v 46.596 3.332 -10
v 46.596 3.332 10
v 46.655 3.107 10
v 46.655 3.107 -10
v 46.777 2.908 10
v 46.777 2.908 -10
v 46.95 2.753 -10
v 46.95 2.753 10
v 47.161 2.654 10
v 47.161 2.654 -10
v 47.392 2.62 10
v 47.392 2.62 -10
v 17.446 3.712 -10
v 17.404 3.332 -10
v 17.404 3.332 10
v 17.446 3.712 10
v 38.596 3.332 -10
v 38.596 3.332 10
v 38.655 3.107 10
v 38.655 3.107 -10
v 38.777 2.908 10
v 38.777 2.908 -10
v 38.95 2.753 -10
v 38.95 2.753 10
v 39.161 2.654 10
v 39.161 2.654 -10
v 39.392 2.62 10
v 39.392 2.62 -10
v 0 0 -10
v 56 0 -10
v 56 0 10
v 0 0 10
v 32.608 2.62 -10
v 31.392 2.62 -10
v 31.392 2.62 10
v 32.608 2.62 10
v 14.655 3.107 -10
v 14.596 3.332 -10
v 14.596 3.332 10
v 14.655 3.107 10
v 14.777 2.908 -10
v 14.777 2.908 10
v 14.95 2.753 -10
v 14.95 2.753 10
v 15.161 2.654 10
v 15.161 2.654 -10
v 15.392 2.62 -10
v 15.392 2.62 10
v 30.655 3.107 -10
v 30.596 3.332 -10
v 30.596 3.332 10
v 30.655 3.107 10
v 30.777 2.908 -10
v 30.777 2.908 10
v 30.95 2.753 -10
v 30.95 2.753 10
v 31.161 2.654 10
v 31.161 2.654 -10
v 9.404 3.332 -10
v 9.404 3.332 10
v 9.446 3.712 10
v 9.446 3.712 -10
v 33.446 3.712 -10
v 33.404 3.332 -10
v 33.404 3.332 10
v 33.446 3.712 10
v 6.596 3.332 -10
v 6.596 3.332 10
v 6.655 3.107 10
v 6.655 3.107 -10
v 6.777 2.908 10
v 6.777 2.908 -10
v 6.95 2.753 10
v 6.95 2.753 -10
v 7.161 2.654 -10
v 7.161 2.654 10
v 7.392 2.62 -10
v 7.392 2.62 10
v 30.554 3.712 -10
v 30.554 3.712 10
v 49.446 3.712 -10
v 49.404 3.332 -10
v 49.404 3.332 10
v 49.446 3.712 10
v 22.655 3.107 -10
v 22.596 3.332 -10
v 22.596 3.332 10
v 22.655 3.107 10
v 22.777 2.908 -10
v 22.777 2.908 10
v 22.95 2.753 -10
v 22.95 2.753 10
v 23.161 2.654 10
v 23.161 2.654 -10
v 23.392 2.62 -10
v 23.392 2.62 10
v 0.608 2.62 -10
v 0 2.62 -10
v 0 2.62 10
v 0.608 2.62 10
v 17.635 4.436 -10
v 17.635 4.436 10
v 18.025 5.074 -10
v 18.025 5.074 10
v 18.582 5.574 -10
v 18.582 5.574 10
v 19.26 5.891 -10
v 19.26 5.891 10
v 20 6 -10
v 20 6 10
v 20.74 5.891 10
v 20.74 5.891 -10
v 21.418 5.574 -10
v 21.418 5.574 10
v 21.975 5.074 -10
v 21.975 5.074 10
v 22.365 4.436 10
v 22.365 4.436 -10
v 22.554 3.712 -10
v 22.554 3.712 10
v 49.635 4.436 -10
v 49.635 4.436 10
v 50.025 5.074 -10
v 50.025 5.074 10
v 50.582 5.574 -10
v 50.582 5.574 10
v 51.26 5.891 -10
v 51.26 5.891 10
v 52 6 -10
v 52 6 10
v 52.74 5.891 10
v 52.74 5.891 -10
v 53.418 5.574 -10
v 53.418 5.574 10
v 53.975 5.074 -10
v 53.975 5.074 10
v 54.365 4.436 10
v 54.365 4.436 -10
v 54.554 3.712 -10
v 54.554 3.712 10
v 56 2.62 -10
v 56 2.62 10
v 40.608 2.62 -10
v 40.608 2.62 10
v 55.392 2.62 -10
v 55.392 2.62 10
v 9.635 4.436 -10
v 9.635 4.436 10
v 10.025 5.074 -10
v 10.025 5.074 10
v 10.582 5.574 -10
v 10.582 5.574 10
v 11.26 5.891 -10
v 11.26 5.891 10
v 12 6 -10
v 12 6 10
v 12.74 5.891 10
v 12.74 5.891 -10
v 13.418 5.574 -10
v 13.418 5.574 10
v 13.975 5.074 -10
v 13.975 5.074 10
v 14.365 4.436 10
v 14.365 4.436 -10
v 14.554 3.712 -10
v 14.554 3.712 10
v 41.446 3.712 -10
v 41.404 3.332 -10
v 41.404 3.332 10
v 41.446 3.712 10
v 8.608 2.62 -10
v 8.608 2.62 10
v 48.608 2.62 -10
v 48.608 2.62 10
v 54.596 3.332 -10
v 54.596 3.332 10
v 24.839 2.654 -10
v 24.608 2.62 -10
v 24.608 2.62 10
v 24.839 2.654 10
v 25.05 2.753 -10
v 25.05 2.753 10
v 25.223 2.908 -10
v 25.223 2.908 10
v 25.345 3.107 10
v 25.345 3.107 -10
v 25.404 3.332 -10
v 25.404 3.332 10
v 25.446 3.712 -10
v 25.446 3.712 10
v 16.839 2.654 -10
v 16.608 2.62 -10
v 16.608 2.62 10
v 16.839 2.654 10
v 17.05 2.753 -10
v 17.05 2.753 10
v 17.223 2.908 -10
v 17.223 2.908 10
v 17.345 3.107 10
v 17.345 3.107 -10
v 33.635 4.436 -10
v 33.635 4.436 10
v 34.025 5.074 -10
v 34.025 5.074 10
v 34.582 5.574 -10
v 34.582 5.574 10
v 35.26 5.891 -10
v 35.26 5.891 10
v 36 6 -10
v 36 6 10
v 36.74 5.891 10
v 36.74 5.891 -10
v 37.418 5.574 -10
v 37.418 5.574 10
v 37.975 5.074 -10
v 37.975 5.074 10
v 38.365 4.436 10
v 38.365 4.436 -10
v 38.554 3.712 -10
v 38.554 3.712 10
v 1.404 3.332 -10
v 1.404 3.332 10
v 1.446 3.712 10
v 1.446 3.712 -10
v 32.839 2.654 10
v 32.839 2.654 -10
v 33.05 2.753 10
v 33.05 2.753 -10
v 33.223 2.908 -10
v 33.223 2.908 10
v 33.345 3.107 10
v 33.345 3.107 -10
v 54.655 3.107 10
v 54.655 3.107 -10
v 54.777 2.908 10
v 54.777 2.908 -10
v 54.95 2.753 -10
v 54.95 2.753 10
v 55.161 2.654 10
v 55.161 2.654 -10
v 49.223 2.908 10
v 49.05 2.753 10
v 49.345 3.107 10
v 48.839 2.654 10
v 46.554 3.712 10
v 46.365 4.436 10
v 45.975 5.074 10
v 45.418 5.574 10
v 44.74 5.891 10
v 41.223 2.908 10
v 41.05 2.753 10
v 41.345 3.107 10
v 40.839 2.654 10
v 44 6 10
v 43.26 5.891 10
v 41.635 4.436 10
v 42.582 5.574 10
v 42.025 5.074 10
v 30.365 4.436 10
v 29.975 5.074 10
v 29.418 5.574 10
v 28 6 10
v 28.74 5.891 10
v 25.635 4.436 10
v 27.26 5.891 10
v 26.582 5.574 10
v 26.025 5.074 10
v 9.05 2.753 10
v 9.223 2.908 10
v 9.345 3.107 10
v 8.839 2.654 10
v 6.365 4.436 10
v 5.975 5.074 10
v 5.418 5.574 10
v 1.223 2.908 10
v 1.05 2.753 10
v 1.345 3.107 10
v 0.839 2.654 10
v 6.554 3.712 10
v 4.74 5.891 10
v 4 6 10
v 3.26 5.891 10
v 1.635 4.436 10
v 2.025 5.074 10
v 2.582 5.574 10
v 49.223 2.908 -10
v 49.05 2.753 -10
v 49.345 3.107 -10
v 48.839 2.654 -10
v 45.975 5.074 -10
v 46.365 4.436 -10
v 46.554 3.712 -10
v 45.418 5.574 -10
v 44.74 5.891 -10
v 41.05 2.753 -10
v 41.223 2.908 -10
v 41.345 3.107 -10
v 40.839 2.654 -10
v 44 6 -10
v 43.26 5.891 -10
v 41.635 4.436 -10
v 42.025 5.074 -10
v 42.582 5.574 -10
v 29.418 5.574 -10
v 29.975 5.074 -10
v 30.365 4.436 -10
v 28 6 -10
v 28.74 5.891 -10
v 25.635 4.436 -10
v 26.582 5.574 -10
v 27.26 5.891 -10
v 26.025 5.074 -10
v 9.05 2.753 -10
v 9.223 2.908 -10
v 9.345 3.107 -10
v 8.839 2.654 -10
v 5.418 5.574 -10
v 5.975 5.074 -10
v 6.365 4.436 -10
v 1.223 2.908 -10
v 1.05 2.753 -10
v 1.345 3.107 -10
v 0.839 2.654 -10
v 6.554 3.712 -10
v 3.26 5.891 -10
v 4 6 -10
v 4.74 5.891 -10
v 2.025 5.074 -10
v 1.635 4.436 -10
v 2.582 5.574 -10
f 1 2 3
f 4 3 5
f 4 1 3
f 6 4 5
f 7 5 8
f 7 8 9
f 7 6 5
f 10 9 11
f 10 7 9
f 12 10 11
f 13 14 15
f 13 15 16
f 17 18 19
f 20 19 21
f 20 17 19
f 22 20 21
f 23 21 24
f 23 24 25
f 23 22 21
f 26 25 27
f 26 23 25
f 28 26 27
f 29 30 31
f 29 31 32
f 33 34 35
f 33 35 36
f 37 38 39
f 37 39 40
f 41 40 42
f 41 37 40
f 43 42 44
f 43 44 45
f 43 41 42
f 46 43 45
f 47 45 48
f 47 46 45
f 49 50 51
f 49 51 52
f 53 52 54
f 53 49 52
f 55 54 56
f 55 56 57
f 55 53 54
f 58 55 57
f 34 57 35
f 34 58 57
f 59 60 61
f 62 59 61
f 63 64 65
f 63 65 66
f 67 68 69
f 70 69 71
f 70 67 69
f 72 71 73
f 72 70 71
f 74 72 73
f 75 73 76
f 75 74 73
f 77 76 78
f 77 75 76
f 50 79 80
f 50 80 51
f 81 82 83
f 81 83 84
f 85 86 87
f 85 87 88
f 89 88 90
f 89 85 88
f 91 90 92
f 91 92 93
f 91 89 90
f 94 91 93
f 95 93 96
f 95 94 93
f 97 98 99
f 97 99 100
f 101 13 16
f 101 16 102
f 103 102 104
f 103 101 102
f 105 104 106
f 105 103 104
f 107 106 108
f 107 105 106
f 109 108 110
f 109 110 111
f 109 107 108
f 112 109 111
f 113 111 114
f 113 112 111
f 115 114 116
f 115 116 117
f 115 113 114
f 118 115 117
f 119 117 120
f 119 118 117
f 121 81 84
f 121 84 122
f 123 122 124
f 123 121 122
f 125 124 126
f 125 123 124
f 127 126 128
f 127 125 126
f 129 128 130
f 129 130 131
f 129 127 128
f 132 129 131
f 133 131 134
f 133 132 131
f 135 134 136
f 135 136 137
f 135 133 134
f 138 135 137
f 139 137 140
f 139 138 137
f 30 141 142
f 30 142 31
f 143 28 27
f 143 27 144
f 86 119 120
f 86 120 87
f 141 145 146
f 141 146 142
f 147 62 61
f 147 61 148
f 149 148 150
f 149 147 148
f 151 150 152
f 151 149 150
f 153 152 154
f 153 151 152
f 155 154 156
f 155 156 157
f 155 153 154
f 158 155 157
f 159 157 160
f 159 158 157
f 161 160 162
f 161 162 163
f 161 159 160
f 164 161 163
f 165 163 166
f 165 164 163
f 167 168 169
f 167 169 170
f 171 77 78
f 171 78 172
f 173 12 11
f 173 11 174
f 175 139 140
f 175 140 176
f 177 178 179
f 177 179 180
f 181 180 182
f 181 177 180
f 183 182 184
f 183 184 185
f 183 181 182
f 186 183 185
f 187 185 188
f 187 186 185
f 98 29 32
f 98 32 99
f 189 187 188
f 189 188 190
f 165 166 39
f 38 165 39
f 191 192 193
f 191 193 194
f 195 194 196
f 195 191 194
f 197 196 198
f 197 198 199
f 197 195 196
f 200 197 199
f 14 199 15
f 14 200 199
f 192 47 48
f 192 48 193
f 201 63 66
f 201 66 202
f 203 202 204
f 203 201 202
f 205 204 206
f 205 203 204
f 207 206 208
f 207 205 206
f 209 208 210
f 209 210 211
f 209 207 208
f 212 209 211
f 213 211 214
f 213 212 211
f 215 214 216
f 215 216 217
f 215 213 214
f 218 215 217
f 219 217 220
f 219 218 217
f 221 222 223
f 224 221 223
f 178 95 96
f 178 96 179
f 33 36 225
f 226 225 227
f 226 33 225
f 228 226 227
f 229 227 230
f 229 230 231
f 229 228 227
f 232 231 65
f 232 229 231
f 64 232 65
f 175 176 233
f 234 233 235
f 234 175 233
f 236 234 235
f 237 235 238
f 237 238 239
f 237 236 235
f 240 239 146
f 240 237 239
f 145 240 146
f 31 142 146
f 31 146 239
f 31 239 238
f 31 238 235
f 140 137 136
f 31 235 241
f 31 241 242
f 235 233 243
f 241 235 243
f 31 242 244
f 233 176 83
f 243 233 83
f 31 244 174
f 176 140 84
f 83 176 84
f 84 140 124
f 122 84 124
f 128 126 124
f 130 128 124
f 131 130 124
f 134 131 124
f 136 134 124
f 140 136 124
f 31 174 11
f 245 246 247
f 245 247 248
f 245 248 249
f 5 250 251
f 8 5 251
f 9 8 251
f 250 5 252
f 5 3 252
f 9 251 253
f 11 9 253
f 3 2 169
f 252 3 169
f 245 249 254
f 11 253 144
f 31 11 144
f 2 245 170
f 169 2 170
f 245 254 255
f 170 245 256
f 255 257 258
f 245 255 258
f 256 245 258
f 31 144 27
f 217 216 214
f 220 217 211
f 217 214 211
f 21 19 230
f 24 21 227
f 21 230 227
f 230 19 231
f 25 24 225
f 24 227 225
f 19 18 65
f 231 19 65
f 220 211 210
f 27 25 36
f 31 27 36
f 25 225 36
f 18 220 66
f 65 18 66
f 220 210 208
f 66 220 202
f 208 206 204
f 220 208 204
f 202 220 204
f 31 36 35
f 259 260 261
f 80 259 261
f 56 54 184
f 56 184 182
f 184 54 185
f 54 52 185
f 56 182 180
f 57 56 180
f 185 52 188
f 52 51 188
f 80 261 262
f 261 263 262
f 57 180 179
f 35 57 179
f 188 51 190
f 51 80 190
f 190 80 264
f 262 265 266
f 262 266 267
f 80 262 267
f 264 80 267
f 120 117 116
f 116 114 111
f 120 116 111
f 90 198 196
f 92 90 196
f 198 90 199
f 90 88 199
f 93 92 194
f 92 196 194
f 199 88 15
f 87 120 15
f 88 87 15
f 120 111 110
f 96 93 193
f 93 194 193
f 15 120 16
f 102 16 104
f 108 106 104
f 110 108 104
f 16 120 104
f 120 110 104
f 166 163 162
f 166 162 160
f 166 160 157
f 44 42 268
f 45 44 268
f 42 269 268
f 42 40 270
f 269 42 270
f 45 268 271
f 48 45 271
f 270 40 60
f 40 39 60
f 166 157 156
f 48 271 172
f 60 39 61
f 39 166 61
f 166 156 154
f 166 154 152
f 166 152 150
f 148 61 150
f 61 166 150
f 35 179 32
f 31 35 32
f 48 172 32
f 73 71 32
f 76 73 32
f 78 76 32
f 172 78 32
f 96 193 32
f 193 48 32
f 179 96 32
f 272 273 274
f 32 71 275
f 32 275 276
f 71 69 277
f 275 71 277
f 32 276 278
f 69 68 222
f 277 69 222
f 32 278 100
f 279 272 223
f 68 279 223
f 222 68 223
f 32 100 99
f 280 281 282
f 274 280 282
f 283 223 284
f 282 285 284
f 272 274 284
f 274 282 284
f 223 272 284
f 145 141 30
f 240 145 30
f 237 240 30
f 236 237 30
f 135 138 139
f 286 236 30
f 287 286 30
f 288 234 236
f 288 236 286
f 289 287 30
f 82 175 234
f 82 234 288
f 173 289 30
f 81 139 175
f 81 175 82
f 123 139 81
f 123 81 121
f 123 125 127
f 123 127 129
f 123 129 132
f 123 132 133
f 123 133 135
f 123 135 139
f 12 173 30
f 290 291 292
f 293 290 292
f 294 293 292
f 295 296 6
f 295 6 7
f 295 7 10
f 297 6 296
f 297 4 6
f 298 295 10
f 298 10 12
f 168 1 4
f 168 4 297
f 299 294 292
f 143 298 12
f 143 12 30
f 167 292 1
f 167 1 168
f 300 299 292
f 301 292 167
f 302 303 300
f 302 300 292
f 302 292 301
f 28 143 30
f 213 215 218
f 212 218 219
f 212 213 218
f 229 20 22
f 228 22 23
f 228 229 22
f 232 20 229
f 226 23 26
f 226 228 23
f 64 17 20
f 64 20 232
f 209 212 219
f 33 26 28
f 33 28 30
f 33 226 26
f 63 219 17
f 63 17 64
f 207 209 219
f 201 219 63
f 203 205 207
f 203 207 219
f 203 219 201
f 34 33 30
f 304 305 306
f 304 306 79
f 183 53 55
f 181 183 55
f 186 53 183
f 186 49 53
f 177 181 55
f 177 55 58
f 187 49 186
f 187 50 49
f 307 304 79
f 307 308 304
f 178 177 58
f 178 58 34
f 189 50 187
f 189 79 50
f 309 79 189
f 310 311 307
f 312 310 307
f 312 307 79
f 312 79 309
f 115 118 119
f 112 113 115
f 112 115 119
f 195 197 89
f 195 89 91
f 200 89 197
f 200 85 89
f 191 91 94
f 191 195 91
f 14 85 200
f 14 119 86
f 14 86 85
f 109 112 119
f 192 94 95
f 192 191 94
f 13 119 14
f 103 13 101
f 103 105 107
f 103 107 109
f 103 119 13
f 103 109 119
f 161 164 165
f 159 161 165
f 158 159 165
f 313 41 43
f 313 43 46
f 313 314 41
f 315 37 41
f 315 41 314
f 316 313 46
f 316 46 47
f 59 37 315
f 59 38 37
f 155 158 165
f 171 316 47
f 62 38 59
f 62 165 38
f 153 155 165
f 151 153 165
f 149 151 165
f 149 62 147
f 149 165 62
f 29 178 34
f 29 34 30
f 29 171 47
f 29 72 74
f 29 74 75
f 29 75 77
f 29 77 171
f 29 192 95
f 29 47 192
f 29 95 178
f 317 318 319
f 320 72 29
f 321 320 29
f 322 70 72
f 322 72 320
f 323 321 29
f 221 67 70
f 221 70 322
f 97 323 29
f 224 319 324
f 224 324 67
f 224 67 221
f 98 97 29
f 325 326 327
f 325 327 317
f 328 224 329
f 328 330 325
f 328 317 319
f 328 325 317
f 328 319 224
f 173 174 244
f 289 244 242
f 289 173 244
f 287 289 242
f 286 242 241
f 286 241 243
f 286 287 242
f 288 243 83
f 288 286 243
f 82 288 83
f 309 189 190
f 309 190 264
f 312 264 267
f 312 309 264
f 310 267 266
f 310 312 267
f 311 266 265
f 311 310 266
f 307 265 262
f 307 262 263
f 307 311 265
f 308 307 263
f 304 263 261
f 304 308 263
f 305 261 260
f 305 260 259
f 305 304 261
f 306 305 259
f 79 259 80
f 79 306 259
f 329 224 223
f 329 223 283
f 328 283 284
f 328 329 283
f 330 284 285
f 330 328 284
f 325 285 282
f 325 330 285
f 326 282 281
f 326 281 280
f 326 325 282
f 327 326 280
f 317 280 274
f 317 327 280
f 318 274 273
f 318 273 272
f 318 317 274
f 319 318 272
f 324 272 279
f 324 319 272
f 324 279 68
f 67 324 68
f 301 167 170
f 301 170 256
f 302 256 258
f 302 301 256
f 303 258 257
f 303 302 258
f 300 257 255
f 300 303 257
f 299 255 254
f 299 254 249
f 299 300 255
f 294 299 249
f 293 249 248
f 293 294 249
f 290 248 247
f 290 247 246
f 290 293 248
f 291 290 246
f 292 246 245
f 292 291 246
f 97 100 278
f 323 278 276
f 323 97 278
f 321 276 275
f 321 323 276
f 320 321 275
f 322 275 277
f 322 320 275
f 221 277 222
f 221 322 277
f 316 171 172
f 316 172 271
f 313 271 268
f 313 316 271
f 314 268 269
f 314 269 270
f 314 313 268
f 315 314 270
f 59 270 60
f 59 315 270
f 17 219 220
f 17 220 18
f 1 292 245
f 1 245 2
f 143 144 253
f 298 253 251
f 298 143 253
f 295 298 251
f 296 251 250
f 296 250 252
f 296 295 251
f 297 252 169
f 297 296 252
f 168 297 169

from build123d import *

# Parameters (mm, degrees)
BOSS_EXTRUDE1_DEPTH = 20


with BuildPart() as part:
    # Sketch1 → Boss-Extrude1 (new body)
    with BuildSketch(Plane(origin=(0, 0, -10), x_dir=(-1, 0, 0), z_dir=(0, 0, -1))):
        with BuildLine():
            Line((0, 2.62), (-0.608434486, 2.62))
            ThreePointArc((-0.608434486, 2.62), (-1.142191341, 2.824094286), (-1.403606386, 3.33224095))
            Line((-1.403606386, 3.33224095), (-1.445510274, 3.711925947))
            ThreePointArc((-1.445510274, 3.711925947), (-4, 6), (-6.554489726, 3.711925947))
            Line((-6.554489726, 3.711925947), (-6.596393614, 3.33224095))
            ThreePointArc((-6.596393614, 3.33224095), (-6.857808659, 2.824094286), (-7.391565514, 2.62))
            Line((-7.391565514, 2.62), (-8.608434486, 2.62))
            ThreePointArc((-8.608434486, 2.62), (-9.142191341, 2.824094286), (-9.403606386, 3.33224095))
            Line((-9.403606386, 3.33224095), (-9.445510274, 3.711925947))
            ThreePointArc((-9.445510274, 3.711925947), (-12, 6), (-14.554489726, 3.711925947))
            Line((-14.554489726, 3.711925947), (-14.596393614, 3.33224095))
            ThreePointArc((-14.596393614, 3.33224095), (-14.857808659, 2.824094286), (-15.391565514, 2.62))
            Line((-15.391565514, 2.62), (-16.608434486, 2.62))
            ThreePointArc((-16.608434486, 2.62), (-17.142191341, 2.824094286), (-17.403606386, 3.33224095))
            Line((-17.403606386, 3.33224095), (-17.445510274, 3.711925947))
            ThreePointArc((-17.445510274, 3.711925947), (-20, 6), (-22.554489726, 3.711925947))
            Line((-22.554489726, 3.711925947), (-22.596393614, 3.33224095))
            ThreePointArc((-22.596393614, 3.33224095), (-22.857808659, 2.824094286), (-23.391565514, 2.62))
            Line((-23.391565514, 2.62), (-24.608434486, 2.62))
            ThreePointArc((-24.608434486, 2.62), (-25.142191341, 2.824094286), (-25.403606386, 3.33224095))
            Line((-25.403606386, 3.33224095), (-25.445510274, 3.711925947))
            ThreePointArc((-25.445510274, 3.711925947), (-28, 6), (-30.554489726, 3.711925947))
            Line((-30.554489726, 3.711925947), (-30.596393614, 3.33224095))
            ThreePointArc((-30.596393614, 3.33224095), (-30.857808659, 2.824094286), (-31.391565514, 2.62))
            Line((-31.391565514, 2.62), (-32.608434486, 2.62))
            ThreePointArc((-32.608434486, 2.62), (-33.142191341, 2.824094286), (-33.403606386, 3.33224095))
            Line((-33.403606386, 3.33224095), (-33.445510274, 3.711925947))
            ThreePointArc((-33.445510274, 3.711925947), (-36, 6), (-38.554489726, 3.711925947))
            Line((-38.554489726, 3.711925947), (-38.596393614, 3.33224095))
            ThreePointArc((-38.596393614, 3.33224095), (-38.857808659, 2.824094286), (-39.391565514, 2.62))
            Line((-39.391565514, 2.62), (-40.608434486, 2.62))
            ThreePointArc((-40.608434486, 2.62), (-41.142191341, 2.824094286), (-41.403606386, 3.33224095))
            Line((-41.403606386, 3.33224095), (-41.445510274, 3.711925947))
            ThreePointArc((-41.445510274, 3.711925947), (-44, 6), (-46.554489726, 3.711925947))
            Line((-46.554489726, 3.711925947), (-46.596393614, 3.33224095))
            ThreePointArc((-46.596393614, 3.33224095), (-46.857808659, 2.824094286), (-47.391565514, 2.62))
            Line((-47.391565514, 2.62), (-48.608434486, 2.62))
            ThreePointArc((-48.608434486, 2.62), (-49.142191341, 2.824094286), (-49.403606386, 3.33224095))
            Line((-49.403606386, 3.33224095), (-49.445510274, 3.711925947))
            ThreePointArc((-49.445510274, 3.711925947), (-52, 6), (-54.554489726, 3.711925947))
            Line((-54.554489726, 3.711925947), (-54.596393614, 3.33224095))
            ThreePointArc((-54.596393614, 3.33224095), (-54.857808659, 2.824094286), (-55.391565514, 2.62))
            Line((-55.391565514, 2.62), (-56, 2.62))
            Line((-56, 2.62), (-56, 0))
            Line((-56, 0), (0, 0))
            Line((0, 0), (0, 2.62))
        make_face()
    extrude(amount=-BOSS_EXTRUDE1_DEPTH)


solid = part.part
